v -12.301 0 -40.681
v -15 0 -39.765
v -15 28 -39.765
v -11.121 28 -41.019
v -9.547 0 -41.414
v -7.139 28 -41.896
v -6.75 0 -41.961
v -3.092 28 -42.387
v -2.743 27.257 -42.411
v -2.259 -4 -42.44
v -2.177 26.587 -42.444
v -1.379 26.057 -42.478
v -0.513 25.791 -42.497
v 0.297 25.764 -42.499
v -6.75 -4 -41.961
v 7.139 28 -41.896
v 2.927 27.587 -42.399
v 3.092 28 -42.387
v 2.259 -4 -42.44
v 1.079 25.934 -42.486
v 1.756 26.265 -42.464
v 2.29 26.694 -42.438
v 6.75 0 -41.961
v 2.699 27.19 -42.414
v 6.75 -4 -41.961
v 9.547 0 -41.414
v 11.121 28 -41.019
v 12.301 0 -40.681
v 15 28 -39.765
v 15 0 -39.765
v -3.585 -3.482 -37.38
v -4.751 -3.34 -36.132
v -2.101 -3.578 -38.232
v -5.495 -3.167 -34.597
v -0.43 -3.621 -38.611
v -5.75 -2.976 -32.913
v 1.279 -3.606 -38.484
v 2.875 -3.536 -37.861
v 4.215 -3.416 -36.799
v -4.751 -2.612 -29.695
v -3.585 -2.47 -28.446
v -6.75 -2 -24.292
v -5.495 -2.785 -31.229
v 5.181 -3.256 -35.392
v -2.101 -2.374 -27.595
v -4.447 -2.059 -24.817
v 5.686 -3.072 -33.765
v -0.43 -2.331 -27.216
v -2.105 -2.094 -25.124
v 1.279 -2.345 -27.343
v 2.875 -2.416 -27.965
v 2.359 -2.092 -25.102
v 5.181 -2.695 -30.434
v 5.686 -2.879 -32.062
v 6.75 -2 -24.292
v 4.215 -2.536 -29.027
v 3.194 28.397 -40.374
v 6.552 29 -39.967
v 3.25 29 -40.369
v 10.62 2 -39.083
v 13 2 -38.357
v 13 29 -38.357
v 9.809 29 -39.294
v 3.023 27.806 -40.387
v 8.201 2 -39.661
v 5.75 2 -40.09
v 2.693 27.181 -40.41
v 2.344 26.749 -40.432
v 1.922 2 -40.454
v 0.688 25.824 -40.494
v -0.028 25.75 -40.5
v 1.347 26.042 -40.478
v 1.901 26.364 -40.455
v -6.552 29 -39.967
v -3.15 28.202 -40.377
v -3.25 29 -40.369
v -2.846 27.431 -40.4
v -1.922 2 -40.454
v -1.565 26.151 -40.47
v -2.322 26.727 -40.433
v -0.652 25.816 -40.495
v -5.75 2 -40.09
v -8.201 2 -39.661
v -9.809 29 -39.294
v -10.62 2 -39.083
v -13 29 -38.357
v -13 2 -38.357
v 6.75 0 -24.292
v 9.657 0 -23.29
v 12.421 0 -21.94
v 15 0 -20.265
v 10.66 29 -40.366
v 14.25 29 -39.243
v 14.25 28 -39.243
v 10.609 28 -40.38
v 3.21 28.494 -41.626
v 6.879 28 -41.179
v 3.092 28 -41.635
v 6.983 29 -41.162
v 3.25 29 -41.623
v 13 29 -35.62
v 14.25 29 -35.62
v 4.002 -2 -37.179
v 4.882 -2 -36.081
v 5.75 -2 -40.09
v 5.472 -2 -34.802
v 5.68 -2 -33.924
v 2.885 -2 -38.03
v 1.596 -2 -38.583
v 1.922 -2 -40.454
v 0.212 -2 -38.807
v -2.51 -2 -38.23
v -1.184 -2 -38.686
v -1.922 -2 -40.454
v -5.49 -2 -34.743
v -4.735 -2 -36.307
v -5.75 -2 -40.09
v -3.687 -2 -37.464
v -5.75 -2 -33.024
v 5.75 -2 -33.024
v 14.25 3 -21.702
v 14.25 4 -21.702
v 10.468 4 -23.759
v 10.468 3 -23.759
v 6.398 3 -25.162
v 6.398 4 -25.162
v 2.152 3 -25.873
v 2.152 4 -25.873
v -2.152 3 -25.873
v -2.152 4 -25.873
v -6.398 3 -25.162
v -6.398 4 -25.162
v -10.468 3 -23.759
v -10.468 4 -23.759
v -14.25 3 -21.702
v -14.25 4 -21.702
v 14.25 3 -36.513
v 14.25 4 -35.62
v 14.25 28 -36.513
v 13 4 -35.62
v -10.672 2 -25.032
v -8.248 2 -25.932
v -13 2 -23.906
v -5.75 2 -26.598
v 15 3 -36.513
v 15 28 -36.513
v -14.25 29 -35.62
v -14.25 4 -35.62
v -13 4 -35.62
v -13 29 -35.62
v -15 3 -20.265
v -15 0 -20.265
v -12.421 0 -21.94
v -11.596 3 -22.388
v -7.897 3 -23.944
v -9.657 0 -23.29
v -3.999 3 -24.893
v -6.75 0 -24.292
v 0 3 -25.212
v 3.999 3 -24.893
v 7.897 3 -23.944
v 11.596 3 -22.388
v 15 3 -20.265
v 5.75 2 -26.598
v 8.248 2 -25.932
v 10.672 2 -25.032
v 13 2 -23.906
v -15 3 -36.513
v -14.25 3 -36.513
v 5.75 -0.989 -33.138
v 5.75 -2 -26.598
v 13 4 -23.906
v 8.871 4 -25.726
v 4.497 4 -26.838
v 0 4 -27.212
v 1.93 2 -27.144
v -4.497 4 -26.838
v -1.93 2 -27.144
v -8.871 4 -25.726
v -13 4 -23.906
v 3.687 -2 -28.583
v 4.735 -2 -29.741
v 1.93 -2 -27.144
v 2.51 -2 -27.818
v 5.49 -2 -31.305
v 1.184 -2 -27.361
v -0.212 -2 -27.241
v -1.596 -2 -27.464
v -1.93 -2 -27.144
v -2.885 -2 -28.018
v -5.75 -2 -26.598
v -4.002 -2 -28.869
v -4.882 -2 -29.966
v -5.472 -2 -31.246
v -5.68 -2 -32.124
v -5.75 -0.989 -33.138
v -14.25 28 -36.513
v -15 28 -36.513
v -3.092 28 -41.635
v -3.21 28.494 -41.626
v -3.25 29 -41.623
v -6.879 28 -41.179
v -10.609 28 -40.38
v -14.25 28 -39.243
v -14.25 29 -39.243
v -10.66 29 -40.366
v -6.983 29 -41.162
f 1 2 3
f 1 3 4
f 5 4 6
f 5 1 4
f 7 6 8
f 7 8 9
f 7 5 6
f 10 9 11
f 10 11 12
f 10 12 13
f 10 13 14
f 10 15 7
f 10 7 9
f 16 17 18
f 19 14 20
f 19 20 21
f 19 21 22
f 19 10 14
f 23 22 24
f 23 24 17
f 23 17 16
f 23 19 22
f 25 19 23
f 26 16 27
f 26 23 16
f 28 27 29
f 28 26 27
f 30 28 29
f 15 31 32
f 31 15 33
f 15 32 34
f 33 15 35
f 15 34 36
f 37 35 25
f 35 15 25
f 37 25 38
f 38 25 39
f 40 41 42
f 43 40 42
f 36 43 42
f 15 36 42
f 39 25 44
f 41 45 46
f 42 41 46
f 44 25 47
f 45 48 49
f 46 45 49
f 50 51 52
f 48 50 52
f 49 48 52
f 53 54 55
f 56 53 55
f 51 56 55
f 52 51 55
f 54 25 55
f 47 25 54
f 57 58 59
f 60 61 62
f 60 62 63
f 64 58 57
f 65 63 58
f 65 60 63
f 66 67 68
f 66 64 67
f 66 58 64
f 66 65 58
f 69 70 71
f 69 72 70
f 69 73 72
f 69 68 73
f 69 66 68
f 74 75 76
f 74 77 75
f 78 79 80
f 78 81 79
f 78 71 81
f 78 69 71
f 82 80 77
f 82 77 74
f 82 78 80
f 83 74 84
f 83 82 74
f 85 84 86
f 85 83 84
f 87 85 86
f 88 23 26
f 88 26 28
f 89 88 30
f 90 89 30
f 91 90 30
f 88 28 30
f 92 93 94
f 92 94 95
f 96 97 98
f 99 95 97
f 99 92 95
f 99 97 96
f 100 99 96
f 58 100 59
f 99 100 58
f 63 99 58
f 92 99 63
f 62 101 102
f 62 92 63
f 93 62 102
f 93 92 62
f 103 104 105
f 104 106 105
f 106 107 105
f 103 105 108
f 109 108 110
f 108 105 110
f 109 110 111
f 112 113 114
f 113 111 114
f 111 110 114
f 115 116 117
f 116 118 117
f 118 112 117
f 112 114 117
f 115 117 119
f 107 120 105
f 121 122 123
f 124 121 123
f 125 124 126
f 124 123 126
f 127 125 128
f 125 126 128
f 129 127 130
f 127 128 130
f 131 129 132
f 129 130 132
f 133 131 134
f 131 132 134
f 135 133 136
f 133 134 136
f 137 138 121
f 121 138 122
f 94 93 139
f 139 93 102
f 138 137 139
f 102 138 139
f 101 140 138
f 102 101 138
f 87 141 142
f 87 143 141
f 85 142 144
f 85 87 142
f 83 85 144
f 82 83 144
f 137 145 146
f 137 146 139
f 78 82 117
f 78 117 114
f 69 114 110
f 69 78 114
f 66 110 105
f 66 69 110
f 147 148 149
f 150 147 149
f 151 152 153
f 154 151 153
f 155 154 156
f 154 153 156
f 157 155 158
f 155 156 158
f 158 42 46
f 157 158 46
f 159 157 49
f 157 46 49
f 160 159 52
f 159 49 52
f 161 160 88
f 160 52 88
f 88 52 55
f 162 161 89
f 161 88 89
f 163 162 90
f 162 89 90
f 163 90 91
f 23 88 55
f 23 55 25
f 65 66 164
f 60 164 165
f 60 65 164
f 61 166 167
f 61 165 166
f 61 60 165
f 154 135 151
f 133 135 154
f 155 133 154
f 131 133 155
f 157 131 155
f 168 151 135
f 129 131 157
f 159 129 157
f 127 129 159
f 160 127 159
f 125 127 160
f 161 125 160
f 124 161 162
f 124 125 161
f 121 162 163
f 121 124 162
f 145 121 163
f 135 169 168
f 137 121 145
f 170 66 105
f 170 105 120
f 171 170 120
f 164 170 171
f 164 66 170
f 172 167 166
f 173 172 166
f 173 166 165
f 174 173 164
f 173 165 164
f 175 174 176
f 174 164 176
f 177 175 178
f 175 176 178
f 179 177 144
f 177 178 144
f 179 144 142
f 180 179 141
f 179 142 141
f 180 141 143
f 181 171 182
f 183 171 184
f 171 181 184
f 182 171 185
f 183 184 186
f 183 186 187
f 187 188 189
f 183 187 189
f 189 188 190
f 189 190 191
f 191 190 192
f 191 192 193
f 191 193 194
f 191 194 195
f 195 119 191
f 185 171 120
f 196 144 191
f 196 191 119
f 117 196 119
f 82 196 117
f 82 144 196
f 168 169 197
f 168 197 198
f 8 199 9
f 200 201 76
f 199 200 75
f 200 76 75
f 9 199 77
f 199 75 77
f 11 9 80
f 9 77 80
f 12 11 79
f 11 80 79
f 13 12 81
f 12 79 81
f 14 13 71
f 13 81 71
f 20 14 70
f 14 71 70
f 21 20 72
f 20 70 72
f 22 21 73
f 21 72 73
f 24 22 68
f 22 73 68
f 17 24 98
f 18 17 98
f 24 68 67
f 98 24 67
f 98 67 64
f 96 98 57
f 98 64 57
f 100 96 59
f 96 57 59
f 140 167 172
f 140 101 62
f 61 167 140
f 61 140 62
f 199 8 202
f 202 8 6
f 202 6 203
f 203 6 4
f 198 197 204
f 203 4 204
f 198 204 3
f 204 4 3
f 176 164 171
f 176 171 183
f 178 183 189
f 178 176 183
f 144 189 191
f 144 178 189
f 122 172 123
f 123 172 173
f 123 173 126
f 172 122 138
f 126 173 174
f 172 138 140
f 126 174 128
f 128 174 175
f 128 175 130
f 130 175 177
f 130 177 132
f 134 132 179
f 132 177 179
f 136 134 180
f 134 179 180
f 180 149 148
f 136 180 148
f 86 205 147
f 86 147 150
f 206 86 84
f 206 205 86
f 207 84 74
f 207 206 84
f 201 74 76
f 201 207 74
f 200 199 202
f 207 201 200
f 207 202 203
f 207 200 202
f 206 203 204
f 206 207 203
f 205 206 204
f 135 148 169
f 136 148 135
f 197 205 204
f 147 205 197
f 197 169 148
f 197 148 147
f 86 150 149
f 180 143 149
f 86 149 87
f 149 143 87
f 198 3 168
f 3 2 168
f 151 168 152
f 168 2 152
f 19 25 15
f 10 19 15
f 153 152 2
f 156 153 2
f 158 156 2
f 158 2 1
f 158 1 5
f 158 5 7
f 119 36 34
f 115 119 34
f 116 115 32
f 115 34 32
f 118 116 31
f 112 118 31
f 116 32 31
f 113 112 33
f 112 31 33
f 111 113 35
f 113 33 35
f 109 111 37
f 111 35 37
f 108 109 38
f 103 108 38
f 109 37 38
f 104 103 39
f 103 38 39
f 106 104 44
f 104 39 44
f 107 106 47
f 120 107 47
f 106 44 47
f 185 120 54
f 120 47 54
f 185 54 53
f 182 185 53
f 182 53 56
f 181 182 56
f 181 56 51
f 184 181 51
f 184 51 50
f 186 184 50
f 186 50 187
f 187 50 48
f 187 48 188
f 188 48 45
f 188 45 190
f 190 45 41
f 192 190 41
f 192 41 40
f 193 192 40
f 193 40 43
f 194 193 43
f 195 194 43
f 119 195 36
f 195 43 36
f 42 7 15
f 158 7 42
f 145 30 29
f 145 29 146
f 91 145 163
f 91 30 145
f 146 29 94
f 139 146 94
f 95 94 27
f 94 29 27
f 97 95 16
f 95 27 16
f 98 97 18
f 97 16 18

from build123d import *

# Parameters (mm, degrees)
BOSS_EXTRUDE2_DEPTH      = 2
BOSS_EXTRUDE4_DEPTH      = 4
CUT_EXTRUDE6_DEPTH       = 22.75
SKETCH4_R                = 5.75
CUT_EXTRUDE7_DEPTH       = 2
CUT_EXTRUDE8_DEPTH       = 4
BOSS_EXTRUDE5_DEPTH      = 27
BOSS_EXTRUDE6_DEPTH      = 2
BOSS_EXTRUDE7_DEPTH      = 2
BOSS_EXTRUDE8_DEPTH      = 25
CUT_EXTRUDE10_DEPTH      = 26
SKETCH14_R               = 3.25
CUT_EXTRUDE11_DEPTH      = 1
CUT_EXTRUDE11_DEPTH_BACK = 43.5
CUT_EXTRUDE12_DEPTH      = 1


with BuildPart() as part:
    # Sketch1 → Boss-Extrude2 (new body)
    with BuildSketch(Plane(origin=(0, 0, 0), x_dir=(1, 0, 0), z_dir=(0, 1, 0))):
        with BuildLine():
            Line((-15, 39.764934301), (-15, 20.264934301))
            ThreePointArc((-15, 20.264934301), (0, 25.212448557), (15, 20.264934301))
            Line((15, 20.264934301), (15, 39.764934301))
            ThreePointArc((15, 39.764934301), (0, 42.5), (-15, 39.764934301))
        make_face()
    extrude(amount=BOSS_EXTRUDE2_DEPTH)

    # Sketch2 → Boss-Extrude4 (add)
    with BuildSketch(Plane.XZ):
        with BuildLine():
            Line((6.75, -24.292078179), (6.75, -41.960546946))
            ThreePointArc((6.75, -41.960546946), (0, -42.5), (-6.75, -41.960546946))
            Line((-6.75, -41.960546946), (-6.75, -24.292078179))
            ThreePointArc((-6.75, -24.292078179), (0, -25.212448557), (6.75, -24.292078179))
        make_face()
    extrude(amount=BOSS_EXTRUDE4_DEPTH)

    # Sketch3 → Cut-Extrude6 (cut, through all)
    with BuildSketch(Plane(origin=(6.75, 0, 0), x_dir=(0, 0, -1), z_dir=(1, 0, 0))):
        Polygon((41.960546946, -4), (24.292078179, -2), (24.292078179, -4), align=None)
    extrude(amount=-CUT_EXTRUDE6_DEPTH, mode=Mode.SUBTRACT)

    # Sketch4 → Cut-Extrude7 (cut)
    with BuildSketch(Plane(origin=(0, 0.740280631, -0.083796807), x_dir=(-1, 0, 0), z_dir=(0, -0.993654251, 0.112477687))):
        with Locations((0, 33.039130231)):
            Circle(SKETCH4_R)
    extrude(amount=-CUT_EXTRUDE7_DEPTH, mode=Mode.SUBTRACT)

    # Sketch5 → Cut-Extrude8 (cut)
    with BuildSketch(Plane(origin=(0, 2, 0), x_dir=(1, 0, 0), z_dir=(0, 1, 0))):
        with BuildLine():
            ThreePointArc((-5.75, 40.089743077), (0, 40.5), (5.75, 40.089743077))
            Line((5.75, 40.089743077), (5.75, 26.598023544))
            ThreePointArc((5.75, 26.598023544), (0, 27.212448557), (-5.75, 26.598023544))
            Line((-5.75, 26.598023544), (-5.75, 40.089743077))
        make_face()
    extrude(amount=-CUT_EXTRUDE8_DEPTH, mode=Mode.SUBTRACT)

    # Sketch7 → Boss-Extrude5 (add)
    with BuildSketch(Plane(origin=(0, 2, 0), x_dir=(1, 0, 0), z_dir=(0, 1, 0))):
        with BuildLine():
            Line((-15, 37.619808612), (-15, 39.764934301))
            ThreePointArc((-15, 39.764934301), (0, 42.5), (15, 39.764934301))
            Line((15, 39.764934301), (15, 37.619808612))
            ThreePointArc((15, 37.619808612), (0, 40.5), (-15, 37.619808612))
        make_face()
    extrude(amount=BOSS_EXTRUDE5_DEPTH)

    # Sketch8 → Boss-Extrude6 (add)
    with BuildSketch(Plane(origin=(0, 2, 0), x_dir=(1, 0, 0), z_dir=(0, 1, 0))):
        with BuildLine():
            Line((-15, 22.7050073), (-15, 20.264934301))
            ThreePointArc((-15, 20.264934301), (0, 25.212448557), (15, 20.264934301))
            Line((15, 20.264934301), (15, 22.7050073))
            ThreePointArc((15, 22.7050073), (0, 27.212448557), (-15, 22.7050073))
        make_face()
    extrude(amount=BOSS_EXTRUDE6_DEPTH)

    # Sketch9 → Boss-Extrude7 (add)
    with BuildSketch(Plane(origin=(0, 2, 0), x_dir=(1, 0, 0), z_dir=(0, 1, 0))):
        with BuildLine():
            Line((-15, 37.619808612), (-15, 22.7050073))
            ThreePointArc((-15, 22.7050073), (-14.012881704, 23.32716234), (-13, 23.906429187))
            Line((-13, 23.906429187), (-13, 38.356876828))
            ThreePointArc((-13, 38.356876828), (-14.004849781, 38.001502373), (-15, 37.619808612))
        make_face()
    boss_extrude7 = extrude(amount=BOSS_EXTRUDE7_DEPTH)

    # Mirror1: Boss-Extrude7 across plane
    add(boss_extrude7.mirror(Plane(origin=(0, 0, 0), x_dir=(0, 0, 1), z_dir=(1, 0, 0))))

    # Sketch12 → Boss-Extrude8 (add)
    with BuildSketch(Plane(origin=(0, 4, 0), x_dir=(1, 0, 0), z_dir=(0, 1, 0))):
        with BuildLine():
            ThreePointArc((-13, 38.356876828), (-14.004849781, 38.001502373), (-15, 37.619808612))
            Line((-15, 37.619808612), (-15, 35.619808612))
            Line((-15, 35.619808612), (-13, 35.619808612))
            Line((-13, 35.619808612), (-13, 38.356876828))
        make_face()
        with BuildLine():
            Line((15, 35.619808612), (15, 37.619808612))
            ThreePointArc((15, 37.619808612), (14.004849781, 38.001502373), (13, 38.356876828))
            Line((13, 38.356876828), (13, 35.619808612))
            Line((13, 35.619808612), (15, 35.619808612))
        make_face()
    extrude(amount=BOSS_EXTRUDE8_DEPTH)

    # Sketch13 → Cut-Extrude10 (cut)
    with BuildSketch(Plane(origin=(0, 29, 0), x_dir=(1, 0, 0), z_dir=(0, 1, 0))):
        with BuildLine():
            Line((-14.25, 21.702217285), (-14.25, 36.513007281))
            Line((-14.25, 36.513007281), (-15, 36.513007281))
            Line((-15, 36.513007281), (-15, 20.264934301))
            ThreePointArc((-15, 20.264934301), (0, 25.212448557), (15, 20.264934301))
            Line((15, 20.264934301), (15, 36.513007281))
            Line((15, 36.513007281), (14.25, 36.513007281))
            Line((14.25, 36.513007281), (14.25, 21.702217285))
            ThreePointArc((14.25, 21.702217285), (0, 25.962448557), (-14.25, 21.702217285))
        make_face()
    extrude(amount=-CUT_EXTRUDE10_DEPTH, mode=Mode.SUBTRACT)

    # Sketch14 → Cut-Extrude11 (cut, two sides)
    with BuildSketch(Plane.XY) as cut_extrude11_sk:
        with Locations((0, 29)):
            Circle(SKETCH14_R)
    extrude(amount=CUT_EXTRUDE11_DEPTH, mode=Mode.SUBTRACT)
    extrude(cut_extrude11_sk.sketch, amount=-CUT_EXTRUDE11_DEPTH_BACK, mode=Mode.SUBTRACT)

    # Sketch15 → Cut-Extrude12 (cut)
    with BuildSketch(Plane(origin=(0, 29, 0), x_dir=(1, 0, 0), z_dir=(0, 1, 0))):
        with BuildLine():
            Line((-15, 36.513007281), (-15, 39.764934301))
            ThreePointArc((-15, 39.764934301), (0, 42.5), (15, 39.764934301))
            Line((15, 39.764934301), (15, 36.513007281))
            Line((15, 36.513007281), (14.25, 36.513007281))
            Line((14.25, 36.513007281), (14.25, 39.242833741))
            ThreePointArc((14.25, 39.242833741), (0, 41.75), (-14.25, 39.242833741))
            Line((-14.25, 39.242833741), (-14.25, 36.513007281))
            Line((-14.25, 36.513007281), (-15, 36.513007281))
        make_face()
    extrude(amount=-CUT_EXTRUDE12_DEPTH, mode=Mode.SUBTRACT)


solid = part.part
